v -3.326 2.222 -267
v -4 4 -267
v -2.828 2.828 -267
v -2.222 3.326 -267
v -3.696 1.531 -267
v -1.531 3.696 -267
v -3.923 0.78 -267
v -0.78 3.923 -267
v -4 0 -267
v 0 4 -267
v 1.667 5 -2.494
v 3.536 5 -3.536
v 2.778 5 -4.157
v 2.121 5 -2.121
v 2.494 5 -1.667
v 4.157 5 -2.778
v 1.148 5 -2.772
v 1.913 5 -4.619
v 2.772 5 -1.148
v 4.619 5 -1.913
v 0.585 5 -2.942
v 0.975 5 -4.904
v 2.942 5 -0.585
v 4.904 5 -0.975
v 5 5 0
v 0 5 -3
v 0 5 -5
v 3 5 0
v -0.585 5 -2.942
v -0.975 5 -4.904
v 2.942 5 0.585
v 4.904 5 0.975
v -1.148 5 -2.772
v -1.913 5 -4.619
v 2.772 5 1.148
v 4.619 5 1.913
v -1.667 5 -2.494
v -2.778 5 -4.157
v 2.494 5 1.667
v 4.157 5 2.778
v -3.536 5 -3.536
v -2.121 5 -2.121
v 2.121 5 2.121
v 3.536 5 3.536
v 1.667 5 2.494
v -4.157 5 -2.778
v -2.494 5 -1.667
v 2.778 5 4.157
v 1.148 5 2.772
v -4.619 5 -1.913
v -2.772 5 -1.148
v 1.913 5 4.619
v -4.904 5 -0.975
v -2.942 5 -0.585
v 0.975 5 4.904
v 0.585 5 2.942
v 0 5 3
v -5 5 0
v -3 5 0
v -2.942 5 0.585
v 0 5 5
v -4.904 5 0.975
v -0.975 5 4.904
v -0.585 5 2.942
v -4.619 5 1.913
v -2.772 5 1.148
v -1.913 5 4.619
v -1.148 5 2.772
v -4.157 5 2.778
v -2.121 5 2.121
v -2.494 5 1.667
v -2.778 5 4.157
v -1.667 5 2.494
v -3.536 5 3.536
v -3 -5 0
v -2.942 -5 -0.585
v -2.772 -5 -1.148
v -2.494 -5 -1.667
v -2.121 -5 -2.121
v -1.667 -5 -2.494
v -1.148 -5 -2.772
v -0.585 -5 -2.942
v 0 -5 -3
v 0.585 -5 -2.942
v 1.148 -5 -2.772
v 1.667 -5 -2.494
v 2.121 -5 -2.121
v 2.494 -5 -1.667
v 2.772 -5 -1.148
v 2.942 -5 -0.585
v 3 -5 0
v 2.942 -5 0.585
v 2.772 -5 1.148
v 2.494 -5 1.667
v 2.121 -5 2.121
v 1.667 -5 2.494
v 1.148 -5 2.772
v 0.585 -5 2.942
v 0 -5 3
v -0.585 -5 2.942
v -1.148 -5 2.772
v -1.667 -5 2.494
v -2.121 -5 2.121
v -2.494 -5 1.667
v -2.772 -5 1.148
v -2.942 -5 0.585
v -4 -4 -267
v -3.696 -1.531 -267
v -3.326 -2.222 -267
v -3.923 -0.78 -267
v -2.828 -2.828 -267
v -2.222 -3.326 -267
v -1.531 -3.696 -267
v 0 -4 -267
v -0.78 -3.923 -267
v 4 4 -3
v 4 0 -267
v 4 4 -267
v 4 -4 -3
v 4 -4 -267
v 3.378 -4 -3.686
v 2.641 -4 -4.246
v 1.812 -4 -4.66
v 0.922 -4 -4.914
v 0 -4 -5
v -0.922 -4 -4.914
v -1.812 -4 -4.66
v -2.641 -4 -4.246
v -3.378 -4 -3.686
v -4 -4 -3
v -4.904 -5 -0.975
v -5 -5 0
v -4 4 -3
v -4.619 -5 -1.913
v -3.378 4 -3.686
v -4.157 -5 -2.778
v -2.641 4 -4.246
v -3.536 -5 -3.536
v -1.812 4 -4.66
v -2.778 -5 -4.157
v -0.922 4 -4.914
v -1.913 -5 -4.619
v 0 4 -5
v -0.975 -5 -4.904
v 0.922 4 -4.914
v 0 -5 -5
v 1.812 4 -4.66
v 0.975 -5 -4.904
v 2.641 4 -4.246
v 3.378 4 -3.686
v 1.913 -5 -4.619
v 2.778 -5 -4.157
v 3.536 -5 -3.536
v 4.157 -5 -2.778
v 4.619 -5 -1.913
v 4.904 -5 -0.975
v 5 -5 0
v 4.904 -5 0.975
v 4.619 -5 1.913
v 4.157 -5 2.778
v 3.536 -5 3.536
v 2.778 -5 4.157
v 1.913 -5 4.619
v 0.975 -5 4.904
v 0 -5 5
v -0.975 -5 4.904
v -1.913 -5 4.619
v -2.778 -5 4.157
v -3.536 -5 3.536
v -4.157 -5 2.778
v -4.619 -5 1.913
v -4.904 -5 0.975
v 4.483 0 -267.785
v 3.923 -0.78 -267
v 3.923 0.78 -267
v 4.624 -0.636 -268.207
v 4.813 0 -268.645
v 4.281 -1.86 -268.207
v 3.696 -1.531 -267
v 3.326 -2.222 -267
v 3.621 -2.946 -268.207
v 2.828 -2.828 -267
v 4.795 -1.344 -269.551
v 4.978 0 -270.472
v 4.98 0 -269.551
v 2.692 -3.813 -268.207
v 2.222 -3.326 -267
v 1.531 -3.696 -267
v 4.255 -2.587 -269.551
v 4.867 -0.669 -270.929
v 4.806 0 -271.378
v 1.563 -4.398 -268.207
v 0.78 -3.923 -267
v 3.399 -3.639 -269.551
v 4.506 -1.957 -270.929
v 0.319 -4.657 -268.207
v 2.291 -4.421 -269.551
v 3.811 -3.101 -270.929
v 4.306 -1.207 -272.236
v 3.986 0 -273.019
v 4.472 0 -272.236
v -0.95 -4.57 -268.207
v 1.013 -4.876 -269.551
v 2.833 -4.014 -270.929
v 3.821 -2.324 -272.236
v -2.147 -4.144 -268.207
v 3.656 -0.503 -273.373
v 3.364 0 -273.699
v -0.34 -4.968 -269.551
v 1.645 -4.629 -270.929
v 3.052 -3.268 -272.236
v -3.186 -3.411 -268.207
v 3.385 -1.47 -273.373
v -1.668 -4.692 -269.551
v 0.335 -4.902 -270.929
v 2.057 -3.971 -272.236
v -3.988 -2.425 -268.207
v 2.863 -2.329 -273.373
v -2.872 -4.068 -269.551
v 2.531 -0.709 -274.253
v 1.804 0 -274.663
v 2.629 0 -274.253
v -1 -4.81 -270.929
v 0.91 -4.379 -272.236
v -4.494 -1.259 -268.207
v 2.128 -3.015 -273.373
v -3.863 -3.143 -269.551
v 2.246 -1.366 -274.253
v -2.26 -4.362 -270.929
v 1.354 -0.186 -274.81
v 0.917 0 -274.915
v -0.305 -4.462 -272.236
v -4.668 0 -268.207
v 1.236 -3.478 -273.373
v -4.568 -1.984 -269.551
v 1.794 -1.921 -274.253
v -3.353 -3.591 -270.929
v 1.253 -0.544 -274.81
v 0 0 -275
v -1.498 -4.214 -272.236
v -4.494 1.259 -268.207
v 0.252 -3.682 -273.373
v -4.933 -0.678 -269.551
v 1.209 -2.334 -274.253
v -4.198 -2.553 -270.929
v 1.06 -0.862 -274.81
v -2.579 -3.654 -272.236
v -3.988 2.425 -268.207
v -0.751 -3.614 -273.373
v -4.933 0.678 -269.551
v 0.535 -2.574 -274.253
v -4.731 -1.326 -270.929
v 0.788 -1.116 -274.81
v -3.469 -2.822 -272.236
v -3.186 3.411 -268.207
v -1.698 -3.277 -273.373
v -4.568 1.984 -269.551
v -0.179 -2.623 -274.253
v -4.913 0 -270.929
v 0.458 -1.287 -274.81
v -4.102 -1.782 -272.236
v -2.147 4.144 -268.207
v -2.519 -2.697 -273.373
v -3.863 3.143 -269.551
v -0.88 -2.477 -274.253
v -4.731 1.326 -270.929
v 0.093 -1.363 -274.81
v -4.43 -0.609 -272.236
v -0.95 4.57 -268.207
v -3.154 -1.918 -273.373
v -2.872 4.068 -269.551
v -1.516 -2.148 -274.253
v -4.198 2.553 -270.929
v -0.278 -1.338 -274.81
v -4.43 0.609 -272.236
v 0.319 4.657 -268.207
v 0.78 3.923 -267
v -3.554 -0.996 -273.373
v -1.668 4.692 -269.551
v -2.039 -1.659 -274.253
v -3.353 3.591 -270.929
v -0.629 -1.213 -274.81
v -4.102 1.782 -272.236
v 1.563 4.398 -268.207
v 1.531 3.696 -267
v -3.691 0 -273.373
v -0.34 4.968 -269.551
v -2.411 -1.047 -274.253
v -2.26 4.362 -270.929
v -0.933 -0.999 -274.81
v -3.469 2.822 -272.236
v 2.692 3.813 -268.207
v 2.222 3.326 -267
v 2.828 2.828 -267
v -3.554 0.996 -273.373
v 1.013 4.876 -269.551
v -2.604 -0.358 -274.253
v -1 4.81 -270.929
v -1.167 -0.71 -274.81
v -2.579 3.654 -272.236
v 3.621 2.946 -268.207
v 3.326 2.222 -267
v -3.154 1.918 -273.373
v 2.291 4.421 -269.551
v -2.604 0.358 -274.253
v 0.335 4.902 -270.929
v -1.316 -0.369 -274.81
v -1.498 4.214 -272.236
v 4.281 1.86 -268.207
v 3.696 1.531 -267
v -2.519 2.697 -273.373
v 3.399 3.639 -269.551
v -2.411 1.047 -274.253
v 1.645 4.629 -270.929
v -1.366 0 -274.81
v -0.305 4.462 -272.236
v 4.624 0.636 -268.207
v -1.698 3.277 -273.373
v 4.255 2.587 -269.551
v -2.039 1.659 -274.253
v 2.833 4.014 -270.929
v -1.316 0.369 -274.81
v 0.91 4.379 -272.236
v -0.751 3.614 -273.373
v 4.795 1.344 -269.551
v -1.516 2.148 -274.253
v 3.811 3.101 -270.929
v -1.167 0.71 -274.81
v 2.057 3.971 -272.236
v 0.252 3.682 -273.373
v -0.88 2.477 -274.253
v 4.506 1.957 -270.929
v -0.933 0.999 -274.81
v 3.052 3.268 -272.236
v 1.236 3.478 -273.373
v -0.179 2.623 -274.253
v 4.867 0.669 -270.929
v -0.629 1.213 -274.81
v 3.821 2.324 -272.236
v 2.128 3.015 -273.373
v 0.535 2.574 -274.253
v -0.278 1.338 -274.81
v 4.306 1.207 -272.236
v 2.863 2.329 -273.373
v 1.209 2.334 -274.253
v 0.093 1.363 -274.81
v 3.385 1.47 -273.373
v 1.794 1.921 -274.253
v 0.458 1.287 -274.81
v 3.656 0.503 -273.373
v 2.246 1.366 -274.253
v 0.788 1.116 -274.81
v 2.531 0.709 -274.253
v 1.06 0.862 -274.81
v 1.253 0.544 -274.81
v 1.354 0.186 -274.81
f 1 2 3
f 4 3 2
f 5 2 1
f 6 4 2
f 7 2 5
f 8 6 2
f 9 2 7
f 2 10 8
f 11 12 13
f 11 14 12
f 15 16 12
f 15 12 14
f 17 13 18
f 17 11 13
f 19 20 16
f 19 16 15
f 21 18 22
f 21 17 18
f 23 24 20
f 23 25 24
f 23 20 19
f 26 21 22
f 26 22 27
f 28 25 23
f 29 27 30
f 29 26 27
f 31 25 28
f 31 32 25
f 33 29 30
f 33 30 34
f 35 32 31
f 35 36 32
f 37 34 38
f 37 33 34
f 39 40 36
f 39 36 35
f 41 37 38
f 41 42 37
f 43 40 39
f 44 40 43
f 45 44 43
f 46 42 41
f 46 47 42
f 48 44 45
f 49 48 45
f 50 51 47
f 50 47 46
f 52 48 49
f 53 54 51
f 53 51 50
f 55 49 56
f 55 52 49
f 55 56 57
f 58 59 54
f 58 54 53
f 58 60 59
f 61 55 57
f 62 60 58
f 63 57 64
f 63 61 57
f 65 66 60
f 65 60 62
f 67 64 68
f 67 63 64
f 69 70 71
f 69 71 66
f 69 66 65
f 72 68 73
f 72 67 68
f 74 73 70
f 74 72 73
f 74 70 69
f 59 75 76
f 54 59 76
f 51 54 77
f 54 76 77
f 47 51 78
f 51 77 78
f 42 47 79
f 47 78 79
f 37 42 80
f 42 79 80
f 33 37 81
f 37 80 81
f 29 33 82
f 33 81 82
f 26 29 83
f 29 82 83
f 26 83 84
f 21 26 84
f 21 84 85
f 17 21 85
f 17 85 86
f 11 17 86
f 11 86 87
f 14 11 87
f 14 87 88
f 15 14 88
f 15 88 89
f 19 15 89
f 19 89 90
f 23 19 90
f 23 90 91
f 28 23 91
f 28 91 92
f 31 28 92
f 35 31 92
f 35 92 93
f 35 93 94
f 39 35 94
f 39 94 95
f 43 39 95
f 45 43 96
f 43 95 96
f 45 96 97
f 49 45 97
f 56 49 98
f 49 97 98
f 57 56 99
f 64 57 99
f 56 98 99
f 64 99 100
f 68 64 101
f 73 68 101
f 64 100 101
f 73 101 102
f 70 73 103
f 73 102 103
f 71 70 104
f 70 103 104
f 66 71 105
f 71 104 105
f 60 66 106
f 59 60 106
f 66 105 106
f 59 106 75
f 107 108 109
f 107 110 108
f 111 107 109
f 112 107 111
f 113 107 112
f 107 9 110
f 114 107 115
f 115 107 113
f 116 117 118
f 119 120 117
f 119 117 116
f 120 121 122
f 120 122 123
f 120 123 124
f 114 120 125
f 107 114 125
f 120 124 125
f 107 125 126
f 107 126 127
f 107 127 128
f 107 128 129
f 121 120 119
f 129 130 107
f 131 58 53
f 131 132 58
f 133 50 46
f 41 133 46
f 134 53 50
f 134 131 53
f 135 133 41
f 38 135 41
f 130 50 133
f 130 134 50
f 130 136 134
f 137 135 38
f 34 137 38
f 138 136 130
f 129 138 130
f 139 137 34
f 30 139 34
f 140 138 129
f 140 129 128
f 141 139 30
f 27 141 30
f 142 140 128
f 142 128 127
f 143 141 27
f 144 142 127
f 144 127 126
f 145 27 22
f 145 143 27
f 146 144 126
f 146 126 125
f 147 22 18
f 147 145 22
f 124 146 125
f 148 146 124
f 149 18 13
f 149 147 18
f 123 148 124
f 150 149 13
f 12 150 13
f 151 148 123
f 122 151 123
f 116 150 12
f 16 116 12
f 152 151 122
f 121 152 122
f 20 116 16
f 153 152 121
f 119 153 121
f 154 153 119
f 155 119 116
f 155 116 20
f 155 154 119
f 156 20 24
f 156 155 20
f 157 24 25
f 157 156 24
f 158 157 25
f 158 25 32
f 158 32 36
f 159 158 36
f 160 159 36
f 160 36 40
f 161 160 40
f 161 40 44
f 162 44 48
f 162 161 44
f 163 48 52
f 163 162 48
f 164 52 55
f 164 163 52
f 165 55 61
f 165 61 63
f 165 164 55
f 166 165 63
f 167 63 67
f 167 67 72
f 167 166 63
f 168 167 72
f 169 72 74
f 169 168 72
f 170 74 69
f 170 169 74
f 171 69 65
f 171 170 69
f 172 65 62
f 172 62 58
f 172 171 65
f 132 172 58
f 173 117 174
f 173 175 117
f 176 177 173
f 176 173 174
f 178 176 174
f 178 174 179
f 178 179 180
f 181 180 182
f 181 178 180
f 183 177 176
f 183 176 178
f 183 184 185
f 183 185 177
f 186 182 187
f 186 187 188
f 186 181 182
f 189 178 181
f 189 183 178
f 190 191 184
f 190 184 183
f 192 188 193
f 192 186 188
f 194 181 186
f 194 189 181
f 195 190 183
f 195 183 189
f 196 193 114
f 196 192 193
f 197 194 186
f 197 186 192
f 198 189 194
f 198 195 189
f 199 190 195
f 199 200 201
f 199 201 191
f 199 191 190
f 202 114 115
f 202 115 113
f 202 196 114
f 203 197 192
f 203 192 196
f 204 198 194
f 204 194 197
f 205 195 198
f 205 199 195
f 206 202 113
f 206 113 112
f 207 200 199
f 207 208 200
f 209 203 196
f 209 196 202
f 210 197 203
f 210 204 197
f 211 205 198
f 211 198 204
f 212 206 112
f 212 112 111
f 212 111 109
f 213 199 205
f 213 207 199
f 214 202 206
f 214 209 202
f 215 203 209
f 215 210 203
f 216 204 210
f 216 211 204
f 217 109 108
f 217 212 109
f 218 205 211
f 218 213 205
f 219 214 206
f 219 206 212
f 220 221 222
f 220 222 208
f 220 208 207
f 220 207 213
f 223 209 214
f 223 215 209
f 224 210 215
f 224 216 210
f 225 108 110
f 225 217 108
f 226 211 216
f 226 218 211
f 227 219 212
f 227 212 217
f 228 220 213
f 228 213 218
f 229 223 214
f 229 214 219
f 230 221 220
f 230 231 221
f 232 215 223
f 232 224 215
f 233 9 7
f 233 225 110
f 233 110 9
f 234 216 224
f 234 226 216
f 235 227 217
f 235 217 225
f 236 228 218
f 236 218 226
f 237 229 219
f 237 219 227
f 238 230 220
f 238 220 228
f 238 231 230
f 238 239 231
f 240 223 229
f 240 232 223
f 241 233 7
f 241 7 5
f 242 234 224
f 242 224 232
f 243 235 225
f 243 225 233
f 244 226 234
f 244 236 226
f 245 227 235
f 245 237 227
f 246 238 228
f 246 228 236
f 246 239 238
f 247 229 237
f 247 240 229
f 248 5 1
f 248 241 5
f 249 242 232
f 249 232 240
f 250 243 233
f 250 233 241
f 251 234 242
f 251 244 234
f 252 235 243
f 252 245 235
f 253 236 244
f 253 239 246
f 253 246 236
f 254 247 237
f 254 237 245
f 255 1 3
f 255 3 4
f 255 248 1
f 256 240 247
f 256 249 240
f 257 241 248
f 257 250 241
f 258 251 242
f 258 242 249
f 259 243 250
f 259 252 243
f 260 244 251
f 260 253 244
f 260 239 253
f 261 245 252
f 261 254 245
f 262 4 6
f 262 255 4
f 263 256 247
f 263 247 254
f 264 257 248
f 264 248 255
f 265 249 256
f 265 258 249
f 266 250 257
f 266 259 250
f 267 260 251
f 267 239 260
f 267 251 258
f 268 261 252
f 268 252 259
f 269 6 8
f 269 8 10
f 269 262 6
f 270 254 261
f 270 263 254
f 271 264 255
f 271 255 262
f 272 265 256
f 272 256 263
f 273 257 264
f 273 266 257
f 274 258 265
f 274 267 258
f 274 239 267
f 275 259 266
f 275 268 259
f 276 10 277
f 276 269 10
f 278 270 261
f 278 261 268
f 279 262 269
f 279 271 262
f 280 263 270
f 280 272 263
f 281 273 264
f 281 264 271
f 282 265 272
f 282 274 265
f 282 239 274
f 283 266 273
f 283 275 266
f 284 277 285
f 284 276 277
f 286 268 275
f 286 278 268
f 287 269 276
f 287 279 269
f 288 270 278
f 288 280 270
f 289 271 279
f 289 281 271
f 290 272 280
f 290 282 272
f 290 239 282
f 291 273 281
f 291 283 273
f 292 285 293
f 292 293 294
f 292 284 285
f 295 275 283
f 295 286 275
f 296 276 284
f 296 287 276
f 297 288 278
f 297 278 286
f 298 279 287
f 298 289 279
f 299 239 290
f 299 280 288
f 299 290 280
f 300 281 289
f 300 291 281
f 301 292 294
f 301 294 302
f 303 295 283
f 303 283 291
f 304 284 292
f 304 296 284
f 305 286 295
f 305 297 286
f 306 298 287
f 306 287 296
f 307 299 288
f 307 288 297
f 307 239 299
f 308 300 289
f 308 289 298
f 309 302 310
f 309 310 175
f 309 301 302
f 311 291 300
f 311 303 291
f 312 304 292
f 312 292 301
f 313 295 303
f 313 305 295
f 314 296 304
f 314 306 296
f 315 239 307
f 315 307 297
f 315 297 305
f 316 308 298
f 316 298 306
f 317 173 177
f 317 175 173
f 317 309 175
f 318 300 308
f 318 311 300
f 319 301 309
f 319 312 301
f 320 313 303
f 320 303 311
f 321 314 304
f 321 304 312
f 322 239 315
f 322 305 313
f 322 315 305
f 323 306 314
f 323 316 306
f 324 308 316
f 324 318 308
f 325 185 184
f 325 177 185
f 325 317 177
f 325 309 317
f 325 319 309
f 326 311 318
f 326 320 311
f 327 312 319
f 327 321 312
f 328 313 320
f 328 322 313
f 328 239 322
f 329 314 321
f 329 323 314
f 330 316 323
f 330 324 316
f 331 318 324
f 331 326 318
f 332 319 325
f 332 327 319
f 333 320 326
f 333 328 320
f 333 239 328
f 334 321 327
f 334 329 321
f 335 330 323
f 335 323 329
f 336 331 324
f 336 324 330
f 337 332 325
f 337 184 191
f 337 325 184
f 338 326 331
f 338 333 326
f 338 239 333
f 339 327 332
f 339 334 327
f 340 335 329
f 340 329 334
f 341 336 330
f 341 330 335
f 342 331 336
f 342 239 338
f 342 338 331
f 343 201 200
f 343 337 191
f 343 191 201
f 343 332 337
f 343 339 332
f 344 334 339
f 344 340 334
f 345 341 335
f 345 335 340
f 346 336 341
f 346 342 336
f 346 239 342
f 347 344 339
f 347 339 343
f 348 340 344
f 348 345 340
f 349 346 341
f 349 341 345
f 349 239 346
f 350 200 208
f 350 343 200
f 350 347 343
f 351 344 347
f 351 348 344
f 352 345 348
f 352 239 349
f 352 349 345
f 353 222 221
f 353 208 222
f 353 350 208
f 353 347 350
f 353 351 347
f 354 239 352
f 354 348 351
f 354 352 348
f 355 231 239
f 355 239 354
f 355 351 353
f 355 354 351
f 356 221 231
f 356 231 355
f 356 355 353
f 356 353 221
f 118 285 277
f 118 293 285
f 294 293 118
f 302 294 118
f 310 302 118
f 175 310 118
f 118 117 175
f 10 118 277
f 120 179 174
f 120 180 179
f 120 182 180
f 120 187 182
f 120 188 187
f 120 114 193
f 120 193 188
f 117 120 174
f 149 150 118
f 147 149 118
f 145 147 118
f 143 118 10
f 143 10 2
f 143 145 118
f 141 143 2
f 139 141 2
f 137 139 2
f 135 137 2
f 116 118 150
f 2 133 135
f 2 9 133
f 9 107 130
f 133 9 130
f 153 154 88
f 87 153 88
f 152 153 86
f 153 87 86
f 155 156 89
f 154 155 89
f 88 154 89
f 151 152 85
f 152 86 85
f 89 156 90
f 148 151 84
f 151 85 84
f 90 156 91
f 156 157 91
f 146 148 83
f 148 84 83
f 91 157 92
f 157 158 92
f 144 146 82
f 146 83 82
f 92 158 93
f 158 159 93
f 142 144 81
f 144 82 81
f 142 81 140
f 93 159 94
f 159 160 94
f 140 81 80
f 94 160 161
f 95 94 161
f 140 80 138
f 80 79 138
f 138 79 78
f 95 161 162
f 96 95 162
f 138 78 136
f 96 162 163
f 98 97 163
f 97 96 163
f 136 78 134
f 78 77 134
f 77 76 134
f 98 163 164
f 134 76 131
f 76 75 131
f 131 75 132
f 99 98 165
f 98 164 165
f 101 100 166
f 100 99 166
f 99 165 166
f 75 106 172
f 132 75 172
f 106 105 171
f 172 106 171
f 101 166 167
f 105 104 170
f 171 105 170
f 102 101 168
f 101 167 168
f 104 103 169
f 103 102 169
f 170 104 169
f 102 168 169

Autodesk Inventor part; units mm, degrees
ref_plane "YZ Plane" through (0, 0, 0) normal (1, 0, 0) x (0, 1, 0)
ref_plane "XZ Plane" through (0, 0, 0) normal (0, 1, 0) x (-1, 0, 0)
ref_plane "XY Plane" through (0, 0, 0) normal (0, 0, 1) x (1, 0, 0)
sketch "スケッチ1" plane through (0, 0, 0) normal (0, 1, 0) x (-1, 0, 0)
  line L0 (0, -331.5666) -> (0, 61.0944) projected
  line L1 (-9.0498, 0) -> (7.3416, 0) projected
  circle A0 centre (0, 0) radius 5
  circle A1 centre (0, 0) radius 3
  arc A2 (4, -267) -> (0, -275) centre (0, -270) ccw
  line L2 (4, -267) -> (4, -3)
  line L3 (-4, -267) -> (-4, -3)
  line L4 (0, -275) -> (0, -265)
  line L5 (4, -267) -> (-4, -267)
  dimension "d0" = 10
  dimension "d1" = 6
  dimension "d2" = 10
  dimension "d3" = 270
  dimension "d4" = 8
extrude "押し出し1" add sketch "スケッチ1" along normal mid plane 10 contours A0 L1 A1 L0 | L0 A1 L1 A0 | A0 L0 A1 L1 | L1 A1 L0 A0
revolve "回転1" add sketch "スケッチ1" angle 360 about axis through (0, 0, 0) along (0, 0, 1) picked at (-0.4059, -272.2831) picked at (-2.4012, -266.7204) contours A2 L5 L0 | L5 A2 L0
extrude "押し出し2" add sketch "スケッチ1" along normal mid plane 8 contours L5 A2 L0 | L0 A2 L5 | L3 A0 L0 A2 | L0 A0 L2 A2 picked at (-2.4012, -266.7204) picked at (2.4012, -266.7204)
properties part number "LinkRod"
